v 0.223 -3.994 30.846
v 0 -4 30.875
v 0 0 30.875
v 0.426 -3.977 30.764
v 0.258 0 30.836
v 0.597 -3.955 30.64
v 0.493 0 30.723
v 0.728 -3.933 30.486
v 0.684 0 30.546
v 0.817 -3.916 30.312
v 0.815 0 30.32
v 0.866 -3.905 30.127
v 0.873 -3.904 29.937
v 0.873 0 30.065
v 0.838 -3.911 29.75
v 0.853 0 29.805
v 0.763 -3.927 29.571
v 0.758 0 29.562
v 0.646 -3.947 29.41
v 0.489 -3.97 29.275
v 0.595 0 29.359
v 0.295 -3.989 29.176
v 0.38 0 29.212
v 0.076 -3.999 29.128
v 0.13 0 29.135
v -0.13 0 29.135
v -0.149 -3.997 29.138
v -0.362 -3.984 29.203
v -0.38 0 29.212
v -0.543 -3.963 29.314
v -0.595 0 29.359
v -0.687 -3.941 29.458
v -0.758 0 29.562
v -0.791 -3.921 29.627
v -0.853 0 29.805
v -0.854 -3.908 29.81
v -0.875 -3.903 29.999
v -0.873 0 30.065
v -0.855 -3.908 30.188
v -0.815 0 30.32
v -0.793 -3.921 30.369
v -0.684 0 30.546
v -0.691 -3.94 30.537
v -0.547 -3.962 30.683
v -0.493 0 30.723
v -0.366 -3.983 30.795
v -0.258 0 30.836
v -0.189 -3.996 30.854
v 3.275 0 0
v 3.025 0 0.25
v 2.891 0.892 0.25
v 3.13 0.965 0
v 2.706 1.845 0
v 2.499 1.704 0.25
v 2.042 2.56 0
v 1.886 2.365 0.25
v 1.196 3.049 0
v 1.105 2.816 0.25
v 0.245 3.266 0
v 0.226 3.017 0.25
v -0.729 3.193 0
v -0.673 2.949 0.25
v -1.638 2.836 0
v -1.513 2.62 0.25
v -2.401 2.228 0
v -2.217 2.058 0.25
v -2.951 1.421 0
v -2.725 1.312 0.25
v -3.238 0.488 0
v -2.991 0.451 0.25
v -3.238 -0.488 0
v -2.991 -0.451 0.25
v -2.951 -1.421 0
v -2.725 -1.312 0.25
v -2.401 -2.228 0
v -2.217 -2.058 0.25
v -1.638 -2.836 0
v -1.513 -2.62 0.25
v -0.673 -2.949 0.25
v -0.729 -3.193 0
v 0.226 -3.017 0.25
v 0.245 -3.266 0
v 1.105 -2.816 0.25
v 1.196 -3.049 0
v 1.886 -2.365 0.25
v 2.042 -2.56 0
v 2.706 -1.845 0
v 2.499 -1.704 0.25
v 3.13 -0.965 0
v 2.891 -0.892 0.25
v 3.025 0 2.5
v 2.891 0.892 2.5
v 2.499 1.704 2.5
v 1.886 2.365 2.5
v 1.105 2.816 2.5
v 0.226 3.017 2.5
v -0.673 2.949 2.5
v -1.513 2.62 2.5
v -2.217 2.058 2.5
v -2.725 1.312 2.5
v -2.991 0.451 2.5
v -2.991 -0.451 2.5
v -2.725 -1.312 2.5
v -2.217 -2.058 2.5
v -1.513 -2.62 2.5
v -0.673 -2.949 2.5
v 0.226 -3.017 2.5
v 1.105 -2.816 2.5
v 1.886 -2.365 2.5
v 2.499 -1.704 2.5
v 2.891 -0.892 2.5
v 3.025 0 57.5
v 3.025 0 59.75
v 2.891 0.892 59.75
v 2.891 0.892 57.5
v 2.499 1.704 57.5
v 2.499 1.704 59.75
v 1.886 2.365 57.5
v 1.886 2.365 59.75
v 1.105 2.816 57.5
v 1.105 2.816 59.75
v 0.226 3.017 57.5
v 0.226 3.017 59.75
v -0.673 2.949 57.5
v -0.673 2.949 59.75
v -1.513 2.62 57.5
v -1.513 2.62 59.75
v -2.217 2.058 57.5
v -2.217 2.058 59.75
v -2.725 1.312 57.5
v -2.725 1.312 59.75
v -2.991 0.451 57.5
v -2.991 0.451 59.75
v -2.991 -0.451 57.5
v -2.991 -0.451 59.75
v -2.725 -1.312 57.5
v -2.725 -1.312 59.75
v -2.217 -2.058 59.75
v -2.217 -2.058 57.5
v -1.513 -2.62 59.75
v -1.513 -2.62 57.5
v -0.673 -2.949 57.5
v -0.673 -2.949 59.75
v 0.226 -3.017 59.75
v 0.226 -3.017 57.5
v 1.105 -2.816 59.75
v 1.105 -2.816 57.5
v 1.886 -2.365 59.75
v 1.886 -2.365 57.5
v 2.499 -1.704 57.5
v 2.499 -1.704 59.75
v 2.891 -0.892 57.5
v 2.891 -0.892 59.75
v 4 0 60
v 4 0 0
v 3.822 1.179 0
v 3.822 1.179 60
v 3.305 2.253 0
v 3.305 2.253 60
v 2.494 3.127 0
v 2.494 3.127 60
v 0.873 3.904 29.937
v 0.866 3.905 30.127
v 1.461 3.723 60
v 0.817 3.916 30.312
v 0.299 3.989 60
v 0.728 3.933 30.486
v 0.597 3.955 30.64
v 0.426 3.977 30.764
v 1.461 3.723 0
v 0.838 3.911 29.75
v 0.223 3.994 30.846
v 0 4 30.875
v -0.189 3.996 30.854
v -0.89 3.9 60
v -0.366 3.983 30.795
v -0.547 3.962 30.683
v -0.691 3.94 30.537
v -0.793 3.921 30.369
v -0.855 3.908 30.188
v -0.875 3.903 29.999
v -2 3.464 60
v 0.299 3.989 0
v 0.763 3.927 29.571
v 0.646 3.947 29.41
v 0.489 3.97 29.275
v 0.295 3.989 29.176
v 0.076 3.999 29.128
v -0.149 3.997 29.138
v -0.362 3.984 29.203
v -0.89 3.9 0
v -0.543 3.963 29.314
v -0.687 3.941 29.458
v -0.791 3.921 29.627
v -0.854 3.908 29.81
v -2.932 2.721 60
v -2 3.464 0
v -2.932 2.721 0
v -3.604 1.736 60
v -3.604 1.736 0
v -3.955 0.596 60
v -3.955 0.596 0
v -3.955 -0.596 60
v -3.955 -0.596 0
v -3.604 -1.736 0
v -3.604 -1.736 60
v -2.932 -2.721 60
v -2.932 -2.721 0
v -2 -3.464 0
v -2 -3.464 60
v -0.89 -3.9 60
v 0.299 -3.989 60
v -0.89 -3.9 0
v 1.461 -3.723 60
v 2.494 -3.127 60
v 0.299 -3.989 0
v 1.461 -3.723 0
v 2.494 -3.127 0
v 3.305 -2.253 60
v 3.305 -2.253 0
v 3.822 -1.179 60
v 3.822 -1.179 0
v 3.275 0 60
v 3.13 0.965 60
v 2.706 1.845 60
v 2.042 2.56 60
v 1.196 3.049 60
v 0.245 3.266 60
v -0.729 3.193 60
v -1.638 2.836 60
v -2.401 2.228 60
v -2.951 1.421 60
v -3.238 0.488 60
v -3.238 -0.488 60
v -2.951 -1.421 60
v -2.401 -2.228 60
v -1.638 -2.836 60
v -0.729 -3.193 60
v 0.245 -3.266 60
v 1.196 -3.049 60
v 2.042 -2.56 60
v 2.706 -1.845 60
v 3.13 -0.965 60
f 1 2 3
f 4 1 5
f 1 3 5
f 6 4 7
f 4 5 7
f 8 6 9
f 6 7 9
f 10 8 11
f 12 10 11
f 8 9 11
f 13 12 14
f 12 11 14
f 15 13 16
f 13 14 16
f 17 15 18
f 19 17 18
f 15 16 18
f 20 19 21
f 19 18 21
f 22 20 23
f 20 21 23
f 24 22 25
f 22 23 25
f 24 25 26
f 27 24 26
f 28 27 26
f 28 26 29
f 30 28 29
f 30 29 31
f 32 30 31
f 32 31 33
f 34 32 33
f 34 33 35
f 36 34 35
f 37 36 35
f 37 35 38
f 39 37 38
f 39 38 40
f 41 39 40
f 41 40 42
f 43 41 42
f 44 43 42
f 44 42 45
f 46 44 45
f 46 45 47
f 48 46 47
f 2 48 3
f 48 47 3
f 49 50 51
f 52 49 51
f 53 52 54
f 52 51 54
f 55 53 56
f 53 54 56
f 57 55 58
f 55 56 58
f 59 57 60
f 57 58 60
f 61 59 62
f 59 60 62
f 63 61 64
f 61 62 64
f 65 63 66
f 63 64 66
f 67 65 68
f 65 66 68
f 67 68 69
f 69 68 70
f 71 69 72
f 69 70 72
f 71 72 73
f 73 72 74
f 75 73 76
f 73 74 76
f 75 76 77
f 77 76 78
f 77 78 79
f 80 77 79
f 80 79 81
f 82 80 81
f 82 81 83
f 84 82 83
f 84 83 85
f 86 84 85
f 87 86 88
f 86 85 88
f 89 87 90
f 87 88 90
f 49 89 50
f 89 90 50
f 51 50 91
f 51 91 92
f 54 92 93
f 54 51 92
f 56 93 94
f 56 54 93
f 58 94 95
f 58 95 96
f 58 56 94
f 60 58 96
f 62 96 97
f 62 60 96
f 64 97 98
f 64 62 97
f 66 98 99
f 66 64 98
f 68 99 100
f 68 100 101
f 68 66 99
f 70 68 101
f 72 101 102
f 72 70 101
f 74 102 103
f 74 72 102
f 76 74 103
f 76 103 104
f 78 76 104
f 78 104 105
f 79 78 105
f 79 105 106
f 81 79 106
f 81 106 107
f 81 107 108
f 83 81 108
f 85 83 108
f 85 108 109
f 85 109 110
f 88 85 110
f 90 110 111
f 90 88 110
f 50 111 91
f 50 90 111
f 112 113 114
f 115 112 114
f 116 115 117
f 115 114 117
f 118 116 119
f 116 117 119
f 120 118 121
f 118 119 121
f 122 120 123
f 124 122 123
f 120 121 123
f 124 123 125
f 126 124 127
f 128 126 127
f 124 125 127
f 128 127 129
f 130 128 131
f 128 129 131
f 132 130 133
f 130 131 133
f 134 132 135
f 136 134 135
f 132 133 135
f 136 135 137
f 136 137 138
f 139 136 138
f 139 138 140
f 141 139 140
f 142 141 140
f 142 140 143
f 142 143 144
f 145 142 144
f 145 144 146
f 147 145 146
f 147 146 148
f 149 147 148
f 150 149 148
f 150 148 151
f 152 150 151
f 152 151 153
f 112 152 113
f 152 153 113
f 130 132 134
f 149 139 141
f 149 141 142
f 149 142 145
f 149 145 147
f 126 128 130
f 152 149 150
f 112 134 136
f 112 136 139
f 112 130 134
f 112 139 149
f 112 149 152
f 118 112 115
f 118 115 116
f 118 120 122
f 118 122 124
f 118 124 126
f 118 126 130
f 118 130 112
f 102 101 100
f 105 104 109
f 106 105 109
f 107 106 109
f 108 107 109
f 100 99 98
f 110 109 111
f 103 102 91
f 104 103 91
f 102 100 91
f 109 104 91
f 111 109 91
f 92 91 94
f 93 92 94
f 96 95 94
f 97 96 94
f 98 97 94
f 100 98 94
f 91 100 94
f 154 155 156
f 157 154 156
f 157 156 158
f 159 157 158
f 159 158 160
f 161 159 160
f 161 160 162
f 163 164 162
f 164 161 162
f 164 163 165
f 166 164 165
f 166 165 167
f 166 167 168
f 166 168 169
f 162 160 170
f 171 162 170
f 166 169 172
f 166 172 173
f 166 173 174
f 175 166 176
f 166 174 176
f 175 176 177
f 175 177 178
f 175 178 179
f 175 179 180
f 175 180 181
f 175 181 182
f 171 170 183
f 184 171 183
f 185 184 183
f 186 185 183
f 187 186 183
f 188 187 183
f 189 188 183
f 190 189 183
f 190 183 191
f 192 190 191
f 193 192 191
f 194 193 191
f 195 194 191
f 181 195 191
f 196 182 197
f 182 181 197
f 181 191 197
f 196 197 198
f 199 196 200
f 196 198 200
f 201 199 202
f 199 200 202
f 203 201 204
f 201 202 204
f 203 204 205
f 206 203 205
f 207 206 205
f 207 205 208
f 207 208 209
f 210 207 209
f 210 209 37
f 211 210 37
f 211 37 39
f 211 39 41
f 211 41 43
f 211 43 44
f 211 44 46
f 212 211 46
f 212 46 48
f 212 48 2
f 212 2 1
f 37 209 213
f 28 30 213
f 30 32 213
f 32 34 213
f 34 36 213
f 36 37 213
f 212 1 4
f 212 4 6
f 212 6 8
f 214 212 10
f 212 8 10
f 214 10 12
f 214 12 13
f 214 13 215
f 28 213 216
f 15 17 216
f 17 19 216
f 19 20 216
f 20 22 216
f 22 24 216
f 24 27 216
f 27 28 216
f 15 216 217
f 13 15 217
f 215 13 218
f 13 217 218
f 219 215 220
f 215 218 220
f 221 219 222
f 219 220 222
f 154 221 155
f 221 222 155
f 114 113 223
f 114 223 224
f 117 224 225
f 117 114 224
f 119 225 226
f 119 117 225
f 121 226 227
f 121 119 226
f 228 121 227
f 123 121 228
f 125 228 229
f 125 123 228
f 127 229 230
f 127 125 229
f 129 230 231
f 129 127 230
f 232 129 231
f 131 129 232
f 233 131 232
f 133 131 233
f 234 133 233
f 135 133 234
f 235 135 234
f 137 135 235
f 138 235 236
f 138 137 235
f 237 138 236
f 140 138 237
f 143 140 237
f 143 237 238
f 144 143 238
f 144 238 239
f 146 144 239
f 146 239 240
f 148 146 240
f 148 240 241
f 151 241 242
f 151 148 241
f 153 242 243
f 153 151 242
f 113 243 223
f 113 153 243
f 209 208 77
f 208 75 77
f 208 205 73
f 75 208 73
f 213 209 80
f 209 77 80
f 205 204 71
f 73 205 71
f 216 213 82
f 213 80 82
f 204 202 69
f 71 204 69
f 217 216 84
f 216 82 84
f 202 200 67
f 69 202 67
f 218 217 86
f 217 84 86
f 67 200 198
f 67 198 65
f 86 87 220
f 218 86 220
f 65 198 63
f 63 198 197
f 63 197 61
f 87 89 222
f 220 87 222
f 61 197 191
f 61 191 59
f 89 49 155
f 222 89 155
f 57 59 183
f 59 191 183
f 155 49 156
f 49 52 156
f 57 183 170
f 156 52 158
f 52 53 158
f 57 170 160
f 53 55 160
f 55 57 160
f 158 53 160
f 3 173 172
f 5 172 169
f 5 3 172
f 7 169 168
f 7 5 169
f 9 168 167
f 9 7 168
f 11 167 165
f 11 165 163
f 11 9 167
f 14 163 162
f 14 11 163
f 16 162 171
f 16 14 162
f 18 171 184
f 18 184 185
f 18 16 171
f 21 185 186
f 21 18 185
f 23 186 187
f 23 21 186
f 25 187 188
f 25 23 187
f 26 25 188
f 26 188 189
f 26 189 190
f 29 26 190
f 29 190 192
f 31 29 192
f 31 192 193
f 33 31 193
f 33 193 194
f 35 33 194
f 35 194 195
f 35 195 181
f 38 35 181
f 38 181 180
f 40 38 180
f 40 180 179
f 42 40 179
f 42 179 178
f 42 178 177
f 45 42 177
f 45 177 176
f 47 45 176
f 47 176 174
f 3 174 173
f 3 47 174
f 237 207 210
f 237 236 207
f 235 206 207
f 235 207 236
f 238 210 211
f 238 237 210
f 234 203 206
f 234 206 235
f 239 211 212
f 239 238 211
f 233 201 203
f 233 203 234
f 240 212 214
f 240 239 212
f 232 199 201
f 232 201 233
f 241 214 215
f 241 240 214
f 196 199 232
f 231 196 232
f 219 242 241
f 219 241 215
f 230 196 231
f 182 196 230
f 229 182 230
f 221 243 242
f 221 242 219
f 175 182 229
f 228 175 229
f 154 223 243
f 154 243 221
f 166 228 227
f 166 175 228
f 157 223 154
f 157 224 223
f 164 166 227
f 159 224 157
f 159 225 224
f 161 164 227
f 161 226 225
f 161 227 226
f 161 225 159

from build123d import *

# Parameters (mm, degrees)
SKETCH1_R               = 4
SKETCH1_R_2             = 3.025
BOSS_EXTRUDE1_DEPTH     = 60
SKETCH1_3_R             = 3.025
CUT_EXTRUDE1_DEPTH      = 2.5
CUT_EXTRUDE2_START      = 60
SKETCH1_4_R             = 3.025
CUT_EXTRUDE2_DEPTH      = 2.5
CHAMFER1_SIZE           = 0.25
SKETCH2_R               = 0.875
CUT_EXTRUDE3_DEPTH      = 61.266076693
CUT_EXTRUDE3_DEPTH_BACK = 61.266076693


with BuildPart() as part:
    # Sketch1 → Boss-Extrude1 (new body)
    with BuildSketch(Plane.XY):
        Circle(SKETCH1_R)
        Circle(SKETCH1_R_2, mode=Mode.SUBTRACT)
        Circle(SKETCH1_R_2)
    extrude(amount=BOSS_EXTRUDE1_DEPTH)

    # Sketch1<3> → Cut-Extrude1 (cut)
    with BuildSketch(Plane.XY):
        Circle(SKETCH1_3_R)
    extrude(amount=CUT_EXTRUDE1_DEPTH, mode=Mode.SUBTRACT)

    # Sketch1<4> → Cut-Extrude2 (cut)
    with BuildSketch(Plane.XY.offset(CUT_EXTRUDE2_START)):
        Circle(SKETCH1_4_R)
    extrude(amount=-CUT_EXTRUDE2_DEPTH, mode=Mode.SUBTRACT)

    # Chamfer1
    chamfer1_edges = [part.edges().sort_by_distance(p)[0] for p in [
        (-3.025, 0, 0),
        (-3.025, 0, 60),
    ]]
    chamfer(chamfer1_edges, length=CHAMFER1_SIZE)

    # Sketch2 → Cut-Extrude3 (cut, two sides)
    with BuildSketch(Plane(origin=(0, 0, 0), x_dir=(1, 0, 0), z_dir=(0, 1, 0))) as cut_extrude3_sk:
        with Locations(Location((0, -30, 0), (0, 0, 270))):
            Circle(SKETCH2_R)
    extrude(amount=CUT_EXTRUDE3_DEPTH, mode=Mode.SUBTRACT)
    extrude(cut_extrude3_sk.sketch, amount=-CUT_EXTRUDE3_DEPTH_BACK, mode=Mode.SUBTRACT)


solid = part.part
